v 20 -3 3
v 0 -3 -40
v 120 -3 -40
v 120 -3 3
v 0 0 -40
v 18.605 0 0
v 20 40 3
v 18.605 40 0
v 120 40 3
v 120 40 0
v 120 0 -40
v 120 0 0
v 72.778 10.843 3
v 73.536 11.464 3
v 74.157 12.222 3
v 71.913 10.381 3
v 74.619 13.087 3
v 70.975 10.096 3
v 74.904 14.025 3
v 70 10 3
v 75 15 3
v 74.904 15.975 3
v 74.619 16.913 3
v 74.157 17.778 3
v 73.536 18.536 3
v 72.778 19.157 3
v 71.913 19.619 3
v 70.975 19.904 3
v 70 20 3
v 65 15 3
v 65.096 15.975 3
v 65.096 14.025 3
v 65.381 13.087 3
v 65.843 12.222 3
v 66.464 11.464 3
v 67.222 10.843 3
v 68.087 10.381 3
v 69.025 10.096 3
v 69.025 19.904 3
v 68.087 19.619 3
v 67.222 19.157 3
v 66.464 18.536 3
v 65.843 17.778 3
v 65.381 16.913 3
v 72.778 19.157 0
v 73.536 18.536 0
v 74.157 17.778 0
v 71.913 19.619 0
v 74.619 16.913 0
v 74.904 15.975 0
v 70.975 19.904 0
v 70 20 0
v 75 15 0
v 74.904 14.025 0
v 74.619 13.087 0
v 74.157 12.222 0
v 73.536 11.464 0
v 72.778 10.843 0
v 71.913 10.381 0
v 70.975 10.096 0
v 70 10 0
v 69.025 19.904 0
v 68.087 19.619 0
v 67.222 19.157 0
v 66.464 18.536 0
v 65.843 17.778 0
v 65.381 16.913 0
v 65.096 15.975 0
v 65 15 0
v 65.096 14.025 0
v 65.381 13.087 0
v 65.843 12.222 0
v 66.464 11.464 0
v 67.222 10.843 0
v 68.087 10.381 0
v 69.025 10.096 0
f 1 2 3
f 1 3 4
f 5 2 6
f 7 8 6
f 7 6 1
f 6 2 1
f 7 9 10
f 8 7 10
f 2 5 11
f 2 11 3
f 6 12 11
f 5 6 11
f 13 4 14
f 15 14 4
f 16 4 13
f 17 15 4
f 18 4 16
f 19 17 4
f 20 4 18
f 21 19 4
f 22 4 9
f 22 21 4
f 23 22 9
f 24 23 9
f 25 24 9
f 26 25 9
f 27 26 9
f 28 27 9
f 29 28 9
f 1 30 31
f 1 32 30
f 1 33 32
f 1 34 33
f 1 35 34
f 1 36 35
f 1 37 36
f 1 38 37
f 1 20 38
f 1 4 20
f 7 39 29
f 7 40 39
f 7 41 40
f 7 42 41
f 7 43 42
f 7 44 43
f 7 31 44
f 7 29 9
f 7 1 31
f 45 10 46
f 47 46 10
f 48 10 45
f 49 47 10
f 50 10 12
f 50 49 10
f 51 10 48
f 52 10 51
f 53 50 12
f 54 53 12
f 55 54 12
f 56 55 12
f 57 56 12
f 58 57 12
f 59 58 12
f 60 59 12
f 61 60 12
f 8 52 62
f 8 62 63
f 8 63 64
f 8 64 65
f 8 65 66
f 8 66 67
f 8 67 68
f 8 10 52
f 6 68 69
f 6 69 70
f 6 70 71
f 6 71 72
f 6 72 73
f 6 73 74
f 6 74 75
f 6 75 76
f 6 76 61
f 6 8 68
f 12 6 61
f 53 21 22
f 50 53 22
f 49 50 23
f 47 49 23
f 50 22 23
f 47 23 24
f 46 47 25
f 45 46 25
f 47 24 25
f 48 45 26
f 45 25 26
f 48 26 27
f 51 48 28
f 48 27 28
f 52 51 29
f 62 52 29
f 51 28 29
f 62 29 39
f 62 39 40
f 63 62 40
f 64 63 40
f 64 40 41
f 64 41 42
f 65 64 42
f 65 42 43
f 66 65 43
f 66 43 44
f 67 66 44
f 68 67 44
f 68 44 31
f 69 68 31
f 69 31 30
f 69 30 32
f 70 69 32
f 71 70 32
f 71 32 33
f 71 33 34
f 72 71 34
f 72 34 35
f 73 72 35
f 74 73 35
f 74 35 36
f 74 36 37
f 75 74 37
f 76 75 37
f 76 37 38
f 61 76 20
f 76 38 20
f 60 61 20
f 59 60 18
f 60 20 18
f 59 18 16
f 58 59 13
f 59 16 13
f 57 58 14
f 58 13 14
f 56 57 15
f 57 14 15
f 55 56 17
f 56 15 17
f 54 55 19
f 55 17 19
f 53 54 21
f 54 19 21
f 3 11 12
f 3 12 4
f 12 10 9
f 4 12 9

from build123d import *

# Parameters (mm, degrees)
EXTRUDE_1_DEPTH     = 120
CUT_EXTRUDE_1_DEPTH = 50
SKETCH_3_R          = 5
CUT_EXTRUDE_2_DEPTH = 10


with BuildPart() as part:
    # Эскиз1 → Вытянуть-Тонкостенный1 (new body)
    with BuildSketch(Plane(origin=(0, 0, 0), x_dir=(0, 0, -1), z_dir=(1, 0, 0))):
        Polygon((0, 40), (0, 0), (40, 0), (40, -3), (-3, -3), (-3, 40), align=None)
    extrude(amount=EXTRUDE_1_DEPTH)

    # Эскиз2 → Вырез-Вытянуть1 (cut)
    with BuildSketch(Plane(origin=(0, -3, 0), x_dir=(1, 0, 0), z_dir=(0, 1, 0))):
        Polygon((0, 40), (20, -3), (0, -3), align=None)
    extrude(amount=CUT_EXTRUDE_1_DEPTH, mode=Mode.SUBTRACT)

    # Эскиз3 → Вырез-Вытянуть2 (cut)
    with BuildSketch(Plane.XY.offset(3)):
        with Locations((70, 15)):
            Circle(SKETCH_3_R)
    extrude(amount=-CUT_EXTRUDE_2_DEPTH, mode=Mode.SUBTRACT)


solid = part.part
